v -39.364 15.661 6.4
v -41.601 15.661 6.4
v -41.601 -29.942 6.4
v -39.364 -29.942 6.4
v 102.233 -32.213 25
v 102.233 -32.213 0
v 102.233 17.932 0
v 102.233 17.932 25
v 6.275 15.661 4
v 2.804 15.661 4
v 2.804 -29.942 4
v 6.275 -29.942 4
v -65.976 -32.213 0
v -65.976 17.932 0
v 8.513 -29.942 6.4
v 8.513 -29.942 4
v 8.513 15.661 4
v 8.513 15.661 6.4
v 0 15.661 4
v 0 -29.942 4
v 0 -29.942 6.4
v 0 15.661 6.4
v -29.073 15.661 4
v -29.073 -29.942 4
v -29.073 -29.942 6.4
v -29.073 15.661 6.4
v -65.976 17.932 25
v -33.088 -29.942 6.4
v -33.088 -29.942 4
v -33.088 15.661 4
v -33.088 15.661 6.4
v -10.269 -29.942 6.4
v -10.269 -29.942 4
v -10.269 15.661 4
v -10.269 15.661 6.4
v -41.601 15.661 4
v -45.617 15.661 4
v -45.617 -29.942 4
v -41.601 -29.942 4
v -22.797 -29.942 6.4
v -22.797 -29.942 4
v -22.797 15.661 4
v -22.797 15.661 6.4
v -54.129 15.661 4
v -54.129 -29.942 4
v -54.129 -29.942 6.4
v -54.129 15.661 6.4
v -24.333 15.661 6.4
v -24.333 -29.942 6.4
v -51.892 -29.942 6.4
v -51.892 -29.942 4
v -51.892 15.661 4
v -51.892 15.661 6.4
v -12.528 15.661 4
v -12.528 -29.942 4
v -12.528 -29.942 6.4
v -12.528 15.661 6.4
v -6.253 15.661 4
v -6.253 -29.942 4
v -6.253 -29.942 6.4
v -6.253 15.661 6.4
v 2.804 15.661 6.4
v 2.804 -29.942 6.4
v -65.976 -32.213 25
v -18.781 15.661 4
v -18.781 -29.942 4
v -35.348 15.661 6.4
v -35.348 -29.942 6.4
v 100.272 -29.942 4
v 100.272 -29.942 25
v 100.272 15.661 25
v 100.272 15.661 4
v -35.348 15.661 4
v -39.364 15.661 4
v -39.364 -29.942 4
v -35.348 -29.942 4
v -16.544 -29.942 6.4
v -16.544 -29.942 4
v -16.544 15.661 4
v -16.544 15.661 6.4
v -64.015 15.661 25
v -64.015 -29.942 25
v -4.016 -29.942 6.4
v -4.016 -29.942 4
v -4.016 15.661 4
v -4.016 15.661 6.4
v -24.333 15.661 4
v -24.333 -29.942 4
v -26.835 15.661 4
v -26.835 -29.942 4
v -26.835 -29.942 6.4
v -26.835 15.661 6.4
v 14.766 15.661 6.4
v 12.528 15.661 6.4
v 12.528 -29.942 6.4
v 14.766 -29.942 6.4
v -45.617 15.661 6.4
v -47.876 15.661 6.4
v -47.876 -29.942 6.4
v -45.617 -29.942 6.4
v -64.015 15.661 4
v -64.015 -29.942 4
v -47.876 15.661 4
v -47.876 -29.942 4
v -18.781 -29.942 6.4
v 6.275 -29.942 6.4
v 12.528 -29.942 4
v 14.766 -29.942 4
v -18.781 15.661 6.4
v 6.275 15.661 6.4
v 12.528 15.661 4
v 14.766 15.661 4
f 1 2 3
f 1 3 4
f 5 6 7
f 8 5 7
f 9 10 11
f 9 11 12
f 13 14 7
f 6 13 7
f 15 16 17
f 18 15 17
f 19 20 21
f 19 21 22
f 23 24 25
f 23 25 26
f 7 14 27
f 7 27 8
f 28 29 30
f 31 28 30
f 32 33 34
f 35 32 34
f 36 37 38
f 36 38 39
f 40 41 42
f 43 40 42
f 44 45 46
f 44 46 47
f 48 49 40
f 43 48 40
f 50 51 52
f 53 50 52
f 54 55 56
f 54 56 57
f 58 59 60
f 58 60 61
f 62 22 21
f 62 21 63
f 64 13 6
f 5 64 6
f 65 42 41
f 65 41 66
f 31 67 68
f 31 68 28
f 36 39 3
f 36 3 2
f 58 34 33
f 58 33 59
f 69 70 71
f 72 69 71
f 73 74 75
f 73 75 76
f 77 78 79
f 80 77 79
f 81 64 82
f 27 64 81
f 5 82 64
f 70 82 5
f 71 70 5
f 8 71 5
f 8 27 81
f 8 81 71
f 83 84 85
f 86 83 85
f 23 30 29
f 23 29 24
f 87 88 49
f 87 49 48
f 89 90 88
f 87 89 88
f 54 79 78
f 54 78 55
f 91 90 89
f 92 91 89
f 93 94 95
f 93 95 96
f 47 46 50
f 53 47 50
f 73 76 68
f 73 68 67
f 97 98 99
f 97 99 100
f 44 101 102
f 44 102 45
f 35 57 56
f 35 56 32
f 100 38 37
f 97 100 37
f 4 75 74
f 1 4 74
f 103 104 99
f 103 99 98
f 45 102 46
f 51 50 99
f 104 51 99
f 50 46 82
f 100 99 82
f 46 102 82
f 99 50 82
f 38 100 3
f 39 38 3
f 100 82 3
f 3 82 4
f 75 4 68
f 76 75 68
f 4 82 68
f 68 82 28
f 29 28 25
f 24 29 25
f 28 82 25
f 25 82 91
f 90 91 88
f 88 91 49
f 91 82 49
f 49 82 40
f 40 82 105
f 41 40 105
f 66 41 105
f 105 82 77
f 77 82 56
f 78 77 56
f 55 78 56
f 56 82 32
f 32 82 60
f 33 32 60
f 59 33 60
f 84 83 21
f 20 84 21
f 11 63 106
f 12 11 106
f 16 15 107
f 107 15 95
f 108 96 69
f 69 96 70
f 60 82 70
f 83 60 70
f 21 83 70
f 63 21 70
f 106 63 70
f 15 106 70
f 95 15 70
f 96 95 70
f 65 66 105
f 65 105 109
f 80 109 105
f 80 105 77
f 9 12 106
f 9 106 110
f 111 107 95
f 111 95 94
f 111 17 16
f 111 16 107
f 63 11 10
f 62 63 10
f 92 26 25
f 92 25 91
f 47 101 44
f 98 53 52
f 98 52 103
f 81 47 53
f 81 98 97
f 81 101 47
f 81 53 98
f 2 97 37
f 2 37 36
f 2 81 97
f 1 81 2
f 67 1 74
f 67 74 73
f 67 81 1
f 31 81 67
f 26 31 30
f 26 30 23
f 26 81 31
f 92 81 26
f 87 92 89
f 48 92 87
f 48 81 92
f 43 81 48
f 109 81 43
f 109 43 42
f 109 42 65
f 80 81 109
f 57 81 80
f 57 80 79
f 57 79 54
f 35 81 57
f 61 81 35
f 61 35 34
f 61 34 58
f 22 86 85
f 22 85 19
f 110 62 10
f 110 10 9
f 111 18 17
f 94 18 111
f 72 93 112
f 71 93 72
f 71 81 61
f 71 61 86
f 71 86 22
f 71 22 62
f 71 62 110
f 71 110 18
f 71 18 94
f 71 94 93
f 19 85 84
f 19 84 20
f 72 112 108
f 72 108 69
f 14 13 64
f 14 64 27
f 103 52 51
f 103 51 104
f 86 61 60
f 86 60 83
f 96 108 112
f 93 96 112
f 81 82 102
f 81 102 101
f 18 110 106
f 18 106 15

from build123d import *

# Parameters (mm, degrees)
F0_W     = 168.208927
F0_H     = 50.145343
F1_DEPTH = 25
F2_W     = 164.286842
F2_H     = 45.602561
F3_DEPTH = 21
F4_W     = 2.237212
F4_H     = 45.602561
F4_W_2   = 2.23721
F4_W_3   = 2.259579
F4_W_4   = 2.25958
F4_W_5   = 1.535502
F4_W_6   = 2.804493
F5_DEPTH = 2.4


with BuildPart() as f1:
    # F0 (on Top) → F1 (new body)
    with BuildSketch(Plane.XY):
        with Locations((18.128507, -7.140766)):
            Rectangle(F0_W, F0_H)
    extrude(amount=F1_DEPTH)

    # F2 (on face) → F3 (cut)
    with BuildSketch(Plane.XY.offset(25)):
        with Locations((18.128509, -7.140767)):
            Rectangle(F2_W, F2_H)
    extrude(amount=-F3_DEPTH, mode=Mode.SUBTRACT)

    # F4 (on face) → F5 (join)
    with BuildSketch(Plane.XY.offset(4)):
        with Locations((-53.010842, -7.140767)):
            Rectangle(F4_W, F4_H)
        with Locations((-40.482435, -7.140767)):
            Rectangle(F4_W_2, F4_H)
        with Locations((-27.954025, -7.140767)):
            Rectangle(F4_W_2, F4_H)
        with Locations((-17.662825, -7.140767)):
            Rectangle(F4_W_2, F4_H)
        with Locations((-5.134415, -7.140767)):
            Rectangle(F4_W_2, F4_H)
        with Locations((7.393995, -7.140767)):
            Rectangle(F4_W_2, F4_H)
        with Locations((-46.746636, -7.140767)):
            Rectangle(F4_W_3, F4_H)
        with Locations((-34.21823, -7.140767)):
            Rectangle(F4_W_4, F4_H)
        with Locations((-23.564991, -7.140767)):
            Rectangle(F4_W_5, F4_H)
        with Locations((-11.39862, -7.140767)):
            Rectangle(F4_W_4, F4_H)
        with Locations((1.402246, -7.140767)):
            Rectangle(F4_W_6, F4_H)
        with Locations((13.647015, -7.140767)):
            Rectangle(F4_W_2, F4_H)
    extrude(amount=F5_DEPTH)


solid = f1.part
